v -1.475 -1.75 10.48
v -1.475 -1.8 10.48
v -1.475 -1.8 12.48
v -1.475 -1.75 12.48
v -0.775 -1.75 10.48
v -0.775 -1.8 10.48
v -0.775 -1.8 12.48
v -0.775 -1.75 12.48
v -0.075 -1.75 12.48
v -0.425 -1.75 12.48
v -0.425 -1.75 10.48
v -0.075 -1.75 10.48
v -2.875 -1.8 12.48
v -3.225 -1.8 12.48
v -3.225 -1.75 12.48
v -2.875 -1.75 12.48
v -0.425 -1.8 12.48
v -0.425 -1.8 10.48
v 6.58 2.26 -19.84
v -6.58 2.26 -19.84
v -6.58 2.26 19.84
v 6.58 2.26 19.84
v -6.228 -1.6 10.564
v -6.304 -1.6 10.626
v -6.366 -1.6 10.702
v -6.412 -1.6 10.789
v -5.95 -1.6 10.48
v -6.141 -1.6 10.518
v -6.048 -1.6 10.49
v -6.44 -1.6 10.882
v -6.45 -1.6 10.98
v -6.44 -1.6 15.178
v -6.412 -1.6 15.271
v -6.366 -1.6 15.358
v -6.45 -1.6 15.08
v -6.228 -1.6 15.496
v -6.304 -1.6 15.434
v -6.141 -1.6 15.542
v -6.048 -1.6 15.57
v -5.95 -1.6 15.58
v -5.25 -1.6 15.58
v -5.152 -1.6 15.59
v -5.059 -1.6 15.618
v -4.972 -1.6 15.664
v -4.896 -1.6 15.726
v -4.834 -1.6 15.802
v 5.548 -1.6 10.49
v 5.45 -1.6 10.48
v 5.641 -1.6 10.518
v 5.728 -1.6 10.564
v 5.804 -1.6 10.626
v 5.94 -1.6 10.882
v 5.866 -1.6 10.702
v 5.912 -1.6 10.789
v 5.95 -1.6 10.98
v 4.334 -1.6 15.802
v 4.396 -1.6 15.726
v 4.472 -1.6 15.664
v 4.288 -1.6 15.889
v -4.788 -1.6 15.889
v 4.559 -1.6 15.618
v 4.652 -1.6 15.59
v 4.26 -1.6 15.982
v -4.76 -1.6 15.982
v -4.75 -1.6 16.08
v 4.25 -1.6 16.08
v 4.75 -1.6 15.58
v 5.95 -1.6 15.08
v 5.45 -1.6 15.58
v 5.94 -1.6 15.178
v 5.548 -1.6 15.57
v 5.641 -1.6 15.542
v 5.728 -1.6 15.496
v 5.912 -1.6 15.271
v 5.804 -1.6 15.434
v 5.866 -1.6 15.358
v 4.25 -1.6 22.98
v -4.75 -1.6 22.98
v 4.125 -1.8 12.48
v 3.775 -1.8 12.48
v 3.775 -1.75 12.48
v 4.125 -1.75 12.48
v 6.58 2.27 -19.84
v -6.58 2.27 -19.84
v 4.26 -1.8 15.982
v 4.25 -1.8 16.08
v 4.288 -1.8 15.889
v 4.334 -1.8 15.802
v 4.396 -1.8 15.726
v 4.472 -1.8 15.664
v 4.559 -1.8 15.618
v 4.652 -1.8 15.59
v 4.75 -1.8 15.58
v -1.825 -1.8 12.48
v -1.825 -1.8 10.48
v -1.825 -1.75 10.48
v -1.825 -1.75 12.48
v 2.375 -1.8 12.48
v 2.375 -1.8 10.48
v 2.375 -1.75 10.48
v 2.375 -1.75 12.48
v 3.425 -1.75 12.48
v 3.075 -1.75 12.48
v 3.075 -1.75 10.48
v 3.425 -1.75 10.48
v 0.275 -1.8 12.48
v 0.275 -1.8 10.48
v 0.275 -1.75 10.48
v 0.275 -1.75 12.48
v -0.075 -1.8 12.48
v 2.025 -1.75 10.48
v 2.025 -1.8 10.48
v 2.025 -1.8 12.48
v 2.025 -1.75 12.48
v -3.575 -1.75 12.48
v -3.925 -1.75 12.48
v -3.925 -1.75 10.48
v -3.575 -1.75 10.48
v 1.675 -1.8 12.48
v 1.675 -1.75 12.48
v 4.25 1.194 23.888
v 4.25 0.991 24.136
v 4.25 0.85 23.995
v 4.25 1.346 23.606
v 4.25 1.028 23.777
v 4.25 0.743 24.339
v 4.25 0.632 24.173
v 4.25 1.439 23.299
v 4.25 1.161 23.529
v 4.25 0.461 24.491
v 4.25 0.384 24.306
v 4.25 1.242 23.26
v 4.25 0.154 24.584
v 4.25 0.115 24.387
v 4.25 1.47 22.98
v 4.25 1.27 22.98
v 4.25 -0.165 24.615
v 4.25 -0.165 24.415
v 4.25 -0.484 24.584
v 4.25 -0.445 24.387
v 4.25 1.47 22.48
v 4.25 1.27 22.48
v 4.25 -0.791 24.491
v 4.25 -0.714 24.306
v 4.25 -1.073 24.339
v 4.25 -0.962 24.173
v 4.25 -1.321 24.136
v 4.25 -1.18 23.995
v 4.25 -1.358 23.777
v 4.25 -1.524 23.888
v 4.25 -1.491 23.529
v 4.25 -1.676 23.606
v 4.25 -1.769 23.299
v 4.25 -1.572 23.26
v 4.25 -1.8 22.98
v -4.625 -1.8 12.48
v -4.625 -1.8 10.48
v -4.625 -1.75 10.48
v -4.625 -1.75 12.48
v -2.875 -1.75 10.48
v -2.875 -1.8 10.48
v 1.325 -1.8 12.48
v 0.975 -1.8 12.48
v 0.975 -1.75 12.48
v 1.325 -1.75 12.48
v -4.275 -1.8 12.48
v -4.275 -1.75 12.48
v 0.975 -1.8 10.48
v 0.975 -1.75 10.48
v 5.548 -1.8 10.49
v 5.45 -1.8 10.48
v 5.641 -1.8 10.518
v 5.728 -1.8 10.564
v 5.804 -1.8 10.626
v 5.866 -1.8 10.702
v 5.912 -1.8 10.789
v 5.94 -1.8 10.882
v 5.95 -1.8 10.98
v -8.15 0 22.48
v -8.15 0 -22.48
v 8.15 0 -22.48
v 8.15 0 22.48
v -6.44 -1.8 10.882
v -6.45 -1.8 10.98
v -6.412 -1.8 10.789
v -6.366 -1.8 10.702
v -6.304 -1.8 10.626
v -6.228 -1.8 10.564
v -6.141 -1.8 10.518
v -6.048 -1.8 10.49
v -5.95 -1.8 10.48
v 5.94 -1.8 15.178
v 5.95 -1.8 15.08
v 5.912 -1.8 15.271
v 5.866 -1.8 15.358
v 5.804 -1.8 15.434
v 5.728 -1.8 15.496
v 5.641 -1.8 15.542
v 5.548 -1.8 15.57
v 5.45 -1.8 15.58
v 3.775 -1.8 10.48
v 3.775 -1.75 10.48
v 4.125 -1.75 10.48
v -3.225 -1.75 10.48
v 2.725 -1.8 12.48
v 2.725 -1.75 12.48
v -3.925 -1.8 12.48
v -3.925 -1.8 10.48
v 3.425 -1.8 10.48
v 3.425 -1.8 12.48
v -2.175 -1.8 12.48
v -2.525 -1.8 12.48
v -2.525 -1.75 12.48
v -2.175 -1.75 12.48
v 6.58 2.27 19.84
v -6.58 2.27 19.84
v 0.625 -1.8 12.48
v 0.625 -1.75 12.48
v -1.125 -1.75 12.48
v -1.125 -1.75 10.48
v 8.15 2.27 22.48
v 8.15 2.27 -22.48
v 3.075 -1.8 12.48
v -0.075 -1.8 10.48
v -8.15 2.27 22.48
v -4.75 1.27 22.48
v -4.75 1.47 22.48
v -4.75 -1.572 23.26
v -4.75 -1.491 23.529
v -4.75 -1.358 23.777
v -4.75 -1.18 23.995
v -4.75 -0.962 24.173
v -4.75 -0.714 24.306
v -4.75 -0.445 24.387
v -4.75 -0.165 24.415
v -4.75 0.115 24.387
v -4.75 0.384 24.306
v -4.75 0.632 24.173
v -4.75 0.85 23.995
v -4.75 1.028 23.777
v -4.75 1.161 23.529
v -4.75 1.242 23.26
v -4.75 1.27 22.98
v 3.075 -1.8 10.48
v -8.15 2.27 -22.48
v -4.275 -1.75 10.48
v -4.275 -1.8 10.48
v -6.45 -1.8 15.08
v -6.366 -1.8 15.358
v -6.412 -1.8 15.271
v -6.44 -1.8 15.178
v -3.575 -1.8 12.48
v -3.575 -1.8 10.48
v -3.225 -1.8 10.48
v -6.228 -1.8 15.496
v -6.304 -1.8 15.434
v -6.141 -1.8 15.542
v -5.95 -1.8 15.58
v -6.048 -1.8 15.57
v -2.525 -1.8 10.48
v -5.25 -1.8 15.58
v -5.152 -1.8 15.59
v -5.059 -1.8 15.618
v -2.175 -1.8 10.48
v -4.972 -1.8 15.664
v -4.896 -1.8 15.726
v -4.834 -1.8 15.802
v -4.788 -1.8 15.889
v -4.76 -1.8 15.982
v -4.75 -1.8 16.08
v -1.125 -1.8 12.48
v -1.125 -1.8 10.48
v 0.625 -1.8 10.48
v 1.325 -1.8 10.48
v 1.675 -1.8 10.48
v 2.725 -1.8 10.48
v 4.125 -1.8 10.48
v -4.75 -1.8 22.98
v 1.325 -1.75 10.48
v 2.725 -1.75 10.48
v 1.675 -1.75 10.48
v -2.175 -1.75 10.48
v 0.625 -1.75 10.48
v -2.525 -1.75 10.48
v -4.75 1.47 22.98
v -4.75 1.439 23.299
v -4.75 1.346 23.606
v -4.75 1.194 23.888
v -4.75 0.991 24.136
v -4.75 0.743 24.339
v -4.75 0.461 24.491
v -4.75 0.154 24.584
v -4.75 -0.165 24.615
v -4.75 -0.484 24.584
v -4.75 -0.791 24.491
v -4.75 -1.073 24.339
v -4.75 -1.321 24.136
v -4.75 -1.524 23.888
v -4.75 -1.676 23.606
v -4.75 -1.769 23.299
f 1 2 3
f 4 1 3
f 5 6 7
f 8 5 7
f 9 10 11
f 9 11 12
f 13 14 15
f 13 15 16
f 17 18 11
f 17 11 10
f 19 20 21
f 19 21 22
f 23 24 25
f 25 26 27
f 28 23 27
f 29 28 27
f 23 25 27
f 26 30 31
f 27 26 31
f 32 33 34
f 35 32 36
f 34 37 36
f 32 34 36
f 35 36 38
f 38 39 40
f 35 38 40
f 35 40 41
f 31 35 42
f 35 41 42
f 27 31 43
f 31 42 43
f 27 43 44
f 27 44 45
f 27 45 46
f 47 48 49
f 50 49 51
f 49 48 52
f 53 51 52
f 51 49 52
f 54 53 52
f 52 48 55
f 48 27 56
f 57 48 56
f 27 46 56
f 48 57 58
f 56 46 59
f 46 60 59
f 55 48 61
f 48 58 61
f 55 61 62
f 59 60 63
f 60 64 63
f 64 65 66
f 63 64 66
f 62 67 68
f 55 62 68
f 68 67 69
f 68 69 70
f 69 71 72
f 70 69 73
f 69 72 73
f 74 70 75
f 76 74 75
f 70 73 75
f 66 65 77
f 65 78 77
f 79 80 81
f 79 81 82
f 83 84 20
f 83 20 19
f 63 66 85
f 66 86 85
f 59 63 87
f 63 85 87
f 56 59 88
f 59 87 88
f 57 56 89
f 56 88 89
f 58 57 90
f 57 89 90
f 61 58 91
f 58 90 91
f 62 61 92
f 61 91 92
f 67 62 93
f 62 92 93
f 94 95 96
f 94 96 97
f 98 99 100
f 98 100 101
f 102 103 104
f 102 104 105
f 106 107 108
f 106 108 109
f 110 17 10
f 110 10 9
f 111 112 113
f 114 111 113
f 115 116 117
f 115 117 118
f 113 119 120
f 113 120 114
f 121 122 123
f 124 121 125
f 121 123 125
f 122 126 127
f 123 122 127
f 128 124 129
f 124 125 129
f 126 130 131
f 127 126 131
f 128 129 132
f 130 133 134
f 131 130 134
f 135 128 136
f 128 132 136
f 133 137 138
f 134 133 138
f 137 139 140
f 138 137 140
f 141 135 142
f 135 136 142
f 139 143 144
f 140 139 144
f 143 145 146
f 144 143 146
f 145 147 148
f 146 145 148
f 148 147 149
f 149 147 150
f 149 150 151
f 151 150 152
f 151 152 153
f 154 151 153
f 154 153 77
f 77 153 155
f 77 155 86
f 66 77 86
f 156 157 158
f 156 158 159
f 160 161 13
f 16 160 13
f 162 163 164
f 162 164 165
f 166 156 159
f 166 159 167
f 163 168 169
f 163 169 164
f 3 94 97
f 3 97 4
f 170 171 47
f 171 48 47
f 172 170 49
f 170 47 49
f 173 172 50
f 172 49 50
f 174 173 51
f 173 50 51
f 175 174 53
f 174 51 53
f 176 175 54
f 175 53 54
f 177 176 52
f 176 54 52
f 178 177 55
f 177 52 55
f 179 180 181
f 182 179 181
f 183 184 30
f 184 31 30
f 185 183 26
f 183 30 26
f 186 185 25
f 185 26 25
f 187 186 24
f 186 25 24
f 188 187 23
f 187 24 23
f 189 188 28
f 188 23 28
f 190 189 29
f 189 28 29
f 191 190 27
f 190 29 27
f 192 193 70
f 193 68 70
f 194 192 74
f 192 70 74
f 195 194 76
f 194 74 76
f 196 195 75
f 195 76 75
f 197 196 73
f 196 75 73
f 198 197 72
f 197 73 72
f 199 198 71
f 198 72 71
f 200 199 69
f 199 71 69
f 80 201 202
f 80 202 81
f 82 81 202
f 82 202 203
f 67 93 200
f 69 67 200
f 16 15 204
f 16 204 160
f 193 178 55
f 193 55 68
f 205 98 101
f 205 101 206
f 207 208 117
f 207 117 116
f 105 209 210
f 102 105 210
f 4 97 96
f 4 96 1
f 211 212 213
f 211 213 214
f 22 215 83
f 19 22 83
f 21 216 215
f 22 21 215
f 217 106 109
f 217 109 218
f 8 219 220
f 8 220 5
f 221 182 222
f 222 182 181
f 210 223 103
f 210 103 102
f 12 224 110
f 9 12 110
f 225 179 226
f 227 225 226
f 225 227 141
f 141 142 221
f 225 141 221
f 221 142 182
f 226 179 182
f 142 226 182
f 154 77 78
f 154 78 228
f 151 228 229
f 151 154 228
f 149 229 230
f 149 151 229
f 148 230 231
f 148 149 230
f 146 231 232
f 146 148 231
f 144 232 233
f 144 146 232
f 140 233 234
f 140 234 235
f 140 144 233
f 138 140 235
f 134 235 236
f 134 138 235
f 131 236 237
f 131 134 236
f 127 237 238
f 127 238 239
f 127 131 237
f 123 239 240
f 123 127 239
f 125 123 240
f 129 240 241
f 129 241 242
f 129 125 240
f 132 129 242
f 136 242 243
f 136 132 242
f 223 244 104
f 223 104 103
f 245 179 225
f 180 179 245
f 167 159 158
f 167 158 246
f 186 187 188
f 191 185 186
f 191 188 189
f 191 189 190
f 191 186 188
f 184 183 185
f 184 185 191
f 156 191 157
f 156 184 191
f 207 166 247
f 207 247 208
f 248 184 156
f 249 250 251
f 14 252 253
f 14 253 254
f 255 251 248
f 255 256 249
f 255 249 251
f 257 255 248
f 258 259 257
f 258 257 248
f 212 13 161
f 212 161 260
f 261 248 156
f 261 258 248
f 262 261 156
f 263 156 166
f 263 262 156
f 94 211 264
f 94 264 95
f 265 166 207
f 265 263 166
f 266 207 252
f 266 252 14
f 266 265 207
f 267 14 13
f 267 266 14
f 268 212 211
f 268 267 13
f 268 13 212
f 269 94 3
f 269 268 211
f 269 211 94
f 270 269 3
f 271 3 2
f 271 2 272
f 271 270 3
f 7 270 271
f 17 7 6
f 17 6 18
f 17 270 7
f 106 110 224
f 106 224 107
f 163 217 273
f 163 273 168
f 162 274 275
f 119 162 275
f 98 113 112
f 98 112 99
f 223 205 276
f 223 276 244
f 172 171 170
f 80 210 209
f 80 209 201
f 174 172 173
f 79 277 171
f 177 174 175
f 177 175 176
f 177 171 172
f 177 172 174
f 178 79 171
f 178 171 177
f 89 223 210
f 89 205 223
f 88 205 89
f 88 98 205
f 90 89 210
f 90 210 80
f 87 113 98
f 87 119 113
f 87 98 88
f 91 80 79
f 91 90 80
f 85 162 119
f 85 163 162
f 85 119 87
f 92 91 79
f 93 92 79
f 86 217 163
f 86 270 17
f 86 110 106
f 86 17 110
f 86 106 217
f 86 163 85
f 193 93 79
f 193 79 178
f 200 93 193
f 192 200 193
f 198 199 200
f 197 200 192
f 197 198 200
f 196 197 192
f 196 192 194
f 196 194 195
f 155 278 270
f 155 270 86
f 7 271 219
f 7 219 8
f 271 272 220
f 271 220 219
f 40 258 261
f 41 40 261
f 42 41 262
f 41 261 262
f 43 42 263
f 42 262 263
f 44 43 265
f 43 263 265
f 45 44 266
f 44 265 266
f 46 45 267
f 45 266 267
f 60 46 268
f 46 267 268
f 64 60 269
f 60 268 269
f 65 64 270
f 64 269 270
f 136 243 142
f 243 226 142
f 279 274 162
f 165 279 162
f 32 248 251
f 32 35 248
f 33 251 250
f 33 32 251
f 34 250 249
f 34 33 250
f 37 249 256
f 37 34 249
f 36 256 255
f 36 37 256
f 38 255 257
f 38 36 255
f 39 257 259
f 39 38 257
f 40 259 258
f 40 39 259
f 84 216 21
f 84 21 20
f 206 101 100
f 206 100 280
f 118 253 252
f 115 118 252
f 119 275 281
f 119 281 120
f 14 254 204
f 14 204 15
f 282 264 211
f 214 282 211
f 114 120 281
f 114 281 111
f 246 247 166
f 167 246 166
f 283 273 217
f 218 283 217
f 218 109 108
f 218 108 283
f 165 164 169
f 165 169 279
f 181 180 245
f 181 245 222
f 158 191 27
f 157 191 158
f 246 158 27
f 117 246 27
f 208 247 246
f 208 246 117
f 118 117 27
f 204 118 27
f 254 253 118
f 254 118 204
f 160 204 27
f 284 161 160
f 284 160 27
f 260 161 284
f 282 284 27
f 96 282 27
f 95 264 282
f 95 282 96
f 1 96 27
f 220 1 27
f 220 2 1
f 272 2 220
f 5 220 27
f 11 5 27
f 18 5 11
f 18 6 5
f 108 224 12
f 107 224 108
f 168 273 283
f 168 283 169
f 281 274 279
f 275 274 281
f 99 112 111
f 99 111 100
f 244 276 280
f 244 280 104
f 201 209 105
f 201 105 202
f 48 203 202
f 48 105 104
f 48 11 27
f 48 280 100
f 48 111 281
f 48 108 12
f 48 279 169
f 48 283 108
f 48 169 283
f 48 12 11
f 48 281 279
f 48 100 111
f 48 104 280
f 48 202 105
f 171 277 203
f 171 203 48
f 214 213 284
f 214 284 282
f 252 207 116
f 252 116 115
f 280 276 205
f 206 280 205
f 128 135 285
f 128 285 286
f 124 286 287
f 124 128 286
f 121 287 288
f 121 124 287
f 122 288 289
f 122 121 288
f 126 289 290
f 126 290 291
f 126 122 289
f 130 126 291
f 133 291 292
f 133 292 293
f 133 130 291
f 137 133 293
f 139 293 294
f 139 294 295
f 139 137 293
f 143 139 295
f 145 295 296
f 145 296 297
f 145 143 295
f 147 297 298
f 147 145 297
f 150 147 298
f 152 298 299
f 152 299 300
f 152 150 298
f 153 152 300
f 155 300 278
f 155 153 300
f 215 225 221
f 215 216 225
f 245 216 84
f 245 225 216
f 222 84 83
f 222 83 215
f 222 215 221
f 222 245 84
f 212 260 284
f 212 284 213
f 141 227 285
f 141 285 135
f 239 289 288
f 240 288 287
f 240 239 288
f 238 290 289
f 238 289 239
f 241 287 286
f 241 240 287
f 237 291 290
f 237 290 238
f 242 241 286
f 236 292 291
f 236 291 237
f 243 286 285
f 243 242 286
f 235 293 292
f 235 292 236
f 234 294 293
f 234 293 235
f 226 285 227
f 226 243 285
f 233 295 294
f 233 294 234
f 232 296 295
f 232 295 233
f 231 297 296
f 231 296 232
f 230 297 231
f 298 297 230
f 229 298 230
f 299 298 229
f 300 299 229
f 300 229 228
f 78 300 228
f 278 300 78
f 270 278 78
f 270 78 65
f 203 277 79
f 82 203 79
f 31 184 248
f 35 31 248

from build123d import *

# Parameters (mm, degrees)
SKETCH_1_W          = 16.3
SKETCH_1_H          = 44.96
EXTRUDE_1_DEPTH     = 2.27
SKETCH_2_W          = 13.16
SKETCH_2_H          = 39.68
CUT_EXTRUDE_1_DEPTH = 0.01
SKETCH_3_W          = 9
SKETCH_3_H          = 0.5
EXTRUDE_2_DEPTH     = 0.2
EXTRUDE_3_DEPTH     = 9
SKETCH_5_W          = 12.4
SKETCH_5_H          = 5.1
EXTRUDE_4_DEPTH     = 0.2
SKETCH_6_W          = 0.35
SKETCH_6_H          = 2
CUT_EXTRUDE_2_DEPTH = 0.05
FILLET_2_R          = 0.5


with BuildPart() as part:
    # 草图1 → 凸台-拉伸1 (new body)
    with BuildSketch(Plane(origin=(0, 0, 0), x_dir=(1, 0, 0), z_dir=(0, 1, 0))):
        Rectangle(SKETCH_1_W, SKETCH_1_H)
    extrude(amount=EXTRUDE_1_DEPTH)

    # 草图2 → 切除-拉伸1 (cut)
    with BuildSketch(Plane(origin=(0, 2.27, 0), x_dir=(1, 0, 0), z_dir=(0, 1, 0))):
        Rectangle(SKETCH_2_W, SKETCH_2_H)
    extrude(amount=-CUT_EXTRUDE_1_DEPTH, mode=Mode.SUBTRACT)

    # 草图3 → 凸台-拉伸2 (add)
    with BuildSketch(Plane(origin=(0, 1.27, 0), x_dir=(1, 0, 0), z_dir=(0, 1, 0))):
        with Locations((-0.25, -22.73)):
            Rectangle(SKETCH_3_W, SKETCH_3_H)
    extrude(amount=EXTRUDE_2_DEPTH)

    # 草图4 → 凸台-拉伸3 (add)
    with BuildSketch(Plane(origin=(4.25, 0, 0), x_dir=(0, 0, -1), z_dir=(1, 0, 0))):
        with BuildLine():
            Line((-22.73, 1.47), (-22.98, 1.47))
            ThreePointArc((-22.98, 1.47), (-24.615, -0.165), (-22.98, -1.8))
            Line((-22.98, -1.8), (-10.48, -1.8))
            Line((-10.48, -1.8), (-10.48, -1.6))
            Line((-10.48, -1.6), (-22.98, -1.6))
            ThreePointArc((-22.98, -1.6), (-24.415, -0.165), (-22.98, 1.27))
            Line((-22.98, 1.27), (-22.73, 1.27))
            Line((-22.73, 1.27), (-22.73, 1.47))
        make_face()
    extrude(amount=-EXTRUDE_3_DEPTH)

    # 草图5 → 凸台-拉伸4 (add)
    with BuildSketch(Plane.XZ.offset(1.8)):
        with Locations((-0.25, 13.03)):
            Rectangle(SKETCH_5_W, SKETCH_5_H)
    extrude(amount=-EXTRUDE_4_DEPTH)

    # 草图6 → 切除-拉伸2 (cut)
    with BuildSketch(Plane.XZ.offset(1.8)):
        with Locations((-4.45, 11.48)):
            Rectangle(SKETCH_6_W, SKETCH_6_H)
        with Locations((-3.75, 11.48)):
            Rectangle(SKETCH_6_W, SKETCH_6_H)
        with Locations((-3.05, 11.48)):
            Rectangle(SKETCH_6_W, SKETCH_6_H)
        with Locations((-2.35, 11.48)):
            Rectangle(SKETCH_6_W, SKETCH_6_H)
        with Locations((-1.65, 11.48)):
            Rectangle(SKETCH_6_W, SKETCH_6_H)
        with Locations((-0.95, 11.48)):
            Rectangle(SKETCH_6_W, SKETCH_6_H)
        with Locations((-0.25, 11.48)):
            Rectangle(SKETCH_6_W, SKETCH_6_H)
        with Locations((0.45, 11.48)):
            Rectangle(SKETCH_6_W, SKETCH_6_H)
        with Locations((1.15, 11.48)):
            Rectangle(SKETCH_6_W, SKETCH_6_H)
        with Locations((1.85, 11.48)):
            Rectangle(SKETCH_6_W, SKETCH_6_H)
        with Locations((2.55, 11.48)):
            Rectangle(SKETCH_6_W, SKETCH_6_H)
        with Locations((3.25, 11.48)):
            Rectangle(SKETCH_6_W, SKETCH_6_H)
        with Locations((3.95, 11.48)):
            Rectangle(SKETCH_6_W, SKETCH_6_H)
    extrude(amount=-CUT_EXTRUDE_2_DEPTH, mode=Mode.SUBTRACT)

    # 圆角2
    fillet_2_edges = [part.edges().sort_by_distance(p)[0] for p in [
        (-6.45, -1.7, 15.58),
        (5.95, -1.7, 10.48),
        (-4.75, -1.7, 15.58),
        (4.25, -1.7, 15.58),
        (-6.45, -1.7, 10.48),
        (5.95, -1.7, 15.58),
    ]]
    fillet(fillet_2_edges, radius=FILLET_2_R)


solid = part.part
